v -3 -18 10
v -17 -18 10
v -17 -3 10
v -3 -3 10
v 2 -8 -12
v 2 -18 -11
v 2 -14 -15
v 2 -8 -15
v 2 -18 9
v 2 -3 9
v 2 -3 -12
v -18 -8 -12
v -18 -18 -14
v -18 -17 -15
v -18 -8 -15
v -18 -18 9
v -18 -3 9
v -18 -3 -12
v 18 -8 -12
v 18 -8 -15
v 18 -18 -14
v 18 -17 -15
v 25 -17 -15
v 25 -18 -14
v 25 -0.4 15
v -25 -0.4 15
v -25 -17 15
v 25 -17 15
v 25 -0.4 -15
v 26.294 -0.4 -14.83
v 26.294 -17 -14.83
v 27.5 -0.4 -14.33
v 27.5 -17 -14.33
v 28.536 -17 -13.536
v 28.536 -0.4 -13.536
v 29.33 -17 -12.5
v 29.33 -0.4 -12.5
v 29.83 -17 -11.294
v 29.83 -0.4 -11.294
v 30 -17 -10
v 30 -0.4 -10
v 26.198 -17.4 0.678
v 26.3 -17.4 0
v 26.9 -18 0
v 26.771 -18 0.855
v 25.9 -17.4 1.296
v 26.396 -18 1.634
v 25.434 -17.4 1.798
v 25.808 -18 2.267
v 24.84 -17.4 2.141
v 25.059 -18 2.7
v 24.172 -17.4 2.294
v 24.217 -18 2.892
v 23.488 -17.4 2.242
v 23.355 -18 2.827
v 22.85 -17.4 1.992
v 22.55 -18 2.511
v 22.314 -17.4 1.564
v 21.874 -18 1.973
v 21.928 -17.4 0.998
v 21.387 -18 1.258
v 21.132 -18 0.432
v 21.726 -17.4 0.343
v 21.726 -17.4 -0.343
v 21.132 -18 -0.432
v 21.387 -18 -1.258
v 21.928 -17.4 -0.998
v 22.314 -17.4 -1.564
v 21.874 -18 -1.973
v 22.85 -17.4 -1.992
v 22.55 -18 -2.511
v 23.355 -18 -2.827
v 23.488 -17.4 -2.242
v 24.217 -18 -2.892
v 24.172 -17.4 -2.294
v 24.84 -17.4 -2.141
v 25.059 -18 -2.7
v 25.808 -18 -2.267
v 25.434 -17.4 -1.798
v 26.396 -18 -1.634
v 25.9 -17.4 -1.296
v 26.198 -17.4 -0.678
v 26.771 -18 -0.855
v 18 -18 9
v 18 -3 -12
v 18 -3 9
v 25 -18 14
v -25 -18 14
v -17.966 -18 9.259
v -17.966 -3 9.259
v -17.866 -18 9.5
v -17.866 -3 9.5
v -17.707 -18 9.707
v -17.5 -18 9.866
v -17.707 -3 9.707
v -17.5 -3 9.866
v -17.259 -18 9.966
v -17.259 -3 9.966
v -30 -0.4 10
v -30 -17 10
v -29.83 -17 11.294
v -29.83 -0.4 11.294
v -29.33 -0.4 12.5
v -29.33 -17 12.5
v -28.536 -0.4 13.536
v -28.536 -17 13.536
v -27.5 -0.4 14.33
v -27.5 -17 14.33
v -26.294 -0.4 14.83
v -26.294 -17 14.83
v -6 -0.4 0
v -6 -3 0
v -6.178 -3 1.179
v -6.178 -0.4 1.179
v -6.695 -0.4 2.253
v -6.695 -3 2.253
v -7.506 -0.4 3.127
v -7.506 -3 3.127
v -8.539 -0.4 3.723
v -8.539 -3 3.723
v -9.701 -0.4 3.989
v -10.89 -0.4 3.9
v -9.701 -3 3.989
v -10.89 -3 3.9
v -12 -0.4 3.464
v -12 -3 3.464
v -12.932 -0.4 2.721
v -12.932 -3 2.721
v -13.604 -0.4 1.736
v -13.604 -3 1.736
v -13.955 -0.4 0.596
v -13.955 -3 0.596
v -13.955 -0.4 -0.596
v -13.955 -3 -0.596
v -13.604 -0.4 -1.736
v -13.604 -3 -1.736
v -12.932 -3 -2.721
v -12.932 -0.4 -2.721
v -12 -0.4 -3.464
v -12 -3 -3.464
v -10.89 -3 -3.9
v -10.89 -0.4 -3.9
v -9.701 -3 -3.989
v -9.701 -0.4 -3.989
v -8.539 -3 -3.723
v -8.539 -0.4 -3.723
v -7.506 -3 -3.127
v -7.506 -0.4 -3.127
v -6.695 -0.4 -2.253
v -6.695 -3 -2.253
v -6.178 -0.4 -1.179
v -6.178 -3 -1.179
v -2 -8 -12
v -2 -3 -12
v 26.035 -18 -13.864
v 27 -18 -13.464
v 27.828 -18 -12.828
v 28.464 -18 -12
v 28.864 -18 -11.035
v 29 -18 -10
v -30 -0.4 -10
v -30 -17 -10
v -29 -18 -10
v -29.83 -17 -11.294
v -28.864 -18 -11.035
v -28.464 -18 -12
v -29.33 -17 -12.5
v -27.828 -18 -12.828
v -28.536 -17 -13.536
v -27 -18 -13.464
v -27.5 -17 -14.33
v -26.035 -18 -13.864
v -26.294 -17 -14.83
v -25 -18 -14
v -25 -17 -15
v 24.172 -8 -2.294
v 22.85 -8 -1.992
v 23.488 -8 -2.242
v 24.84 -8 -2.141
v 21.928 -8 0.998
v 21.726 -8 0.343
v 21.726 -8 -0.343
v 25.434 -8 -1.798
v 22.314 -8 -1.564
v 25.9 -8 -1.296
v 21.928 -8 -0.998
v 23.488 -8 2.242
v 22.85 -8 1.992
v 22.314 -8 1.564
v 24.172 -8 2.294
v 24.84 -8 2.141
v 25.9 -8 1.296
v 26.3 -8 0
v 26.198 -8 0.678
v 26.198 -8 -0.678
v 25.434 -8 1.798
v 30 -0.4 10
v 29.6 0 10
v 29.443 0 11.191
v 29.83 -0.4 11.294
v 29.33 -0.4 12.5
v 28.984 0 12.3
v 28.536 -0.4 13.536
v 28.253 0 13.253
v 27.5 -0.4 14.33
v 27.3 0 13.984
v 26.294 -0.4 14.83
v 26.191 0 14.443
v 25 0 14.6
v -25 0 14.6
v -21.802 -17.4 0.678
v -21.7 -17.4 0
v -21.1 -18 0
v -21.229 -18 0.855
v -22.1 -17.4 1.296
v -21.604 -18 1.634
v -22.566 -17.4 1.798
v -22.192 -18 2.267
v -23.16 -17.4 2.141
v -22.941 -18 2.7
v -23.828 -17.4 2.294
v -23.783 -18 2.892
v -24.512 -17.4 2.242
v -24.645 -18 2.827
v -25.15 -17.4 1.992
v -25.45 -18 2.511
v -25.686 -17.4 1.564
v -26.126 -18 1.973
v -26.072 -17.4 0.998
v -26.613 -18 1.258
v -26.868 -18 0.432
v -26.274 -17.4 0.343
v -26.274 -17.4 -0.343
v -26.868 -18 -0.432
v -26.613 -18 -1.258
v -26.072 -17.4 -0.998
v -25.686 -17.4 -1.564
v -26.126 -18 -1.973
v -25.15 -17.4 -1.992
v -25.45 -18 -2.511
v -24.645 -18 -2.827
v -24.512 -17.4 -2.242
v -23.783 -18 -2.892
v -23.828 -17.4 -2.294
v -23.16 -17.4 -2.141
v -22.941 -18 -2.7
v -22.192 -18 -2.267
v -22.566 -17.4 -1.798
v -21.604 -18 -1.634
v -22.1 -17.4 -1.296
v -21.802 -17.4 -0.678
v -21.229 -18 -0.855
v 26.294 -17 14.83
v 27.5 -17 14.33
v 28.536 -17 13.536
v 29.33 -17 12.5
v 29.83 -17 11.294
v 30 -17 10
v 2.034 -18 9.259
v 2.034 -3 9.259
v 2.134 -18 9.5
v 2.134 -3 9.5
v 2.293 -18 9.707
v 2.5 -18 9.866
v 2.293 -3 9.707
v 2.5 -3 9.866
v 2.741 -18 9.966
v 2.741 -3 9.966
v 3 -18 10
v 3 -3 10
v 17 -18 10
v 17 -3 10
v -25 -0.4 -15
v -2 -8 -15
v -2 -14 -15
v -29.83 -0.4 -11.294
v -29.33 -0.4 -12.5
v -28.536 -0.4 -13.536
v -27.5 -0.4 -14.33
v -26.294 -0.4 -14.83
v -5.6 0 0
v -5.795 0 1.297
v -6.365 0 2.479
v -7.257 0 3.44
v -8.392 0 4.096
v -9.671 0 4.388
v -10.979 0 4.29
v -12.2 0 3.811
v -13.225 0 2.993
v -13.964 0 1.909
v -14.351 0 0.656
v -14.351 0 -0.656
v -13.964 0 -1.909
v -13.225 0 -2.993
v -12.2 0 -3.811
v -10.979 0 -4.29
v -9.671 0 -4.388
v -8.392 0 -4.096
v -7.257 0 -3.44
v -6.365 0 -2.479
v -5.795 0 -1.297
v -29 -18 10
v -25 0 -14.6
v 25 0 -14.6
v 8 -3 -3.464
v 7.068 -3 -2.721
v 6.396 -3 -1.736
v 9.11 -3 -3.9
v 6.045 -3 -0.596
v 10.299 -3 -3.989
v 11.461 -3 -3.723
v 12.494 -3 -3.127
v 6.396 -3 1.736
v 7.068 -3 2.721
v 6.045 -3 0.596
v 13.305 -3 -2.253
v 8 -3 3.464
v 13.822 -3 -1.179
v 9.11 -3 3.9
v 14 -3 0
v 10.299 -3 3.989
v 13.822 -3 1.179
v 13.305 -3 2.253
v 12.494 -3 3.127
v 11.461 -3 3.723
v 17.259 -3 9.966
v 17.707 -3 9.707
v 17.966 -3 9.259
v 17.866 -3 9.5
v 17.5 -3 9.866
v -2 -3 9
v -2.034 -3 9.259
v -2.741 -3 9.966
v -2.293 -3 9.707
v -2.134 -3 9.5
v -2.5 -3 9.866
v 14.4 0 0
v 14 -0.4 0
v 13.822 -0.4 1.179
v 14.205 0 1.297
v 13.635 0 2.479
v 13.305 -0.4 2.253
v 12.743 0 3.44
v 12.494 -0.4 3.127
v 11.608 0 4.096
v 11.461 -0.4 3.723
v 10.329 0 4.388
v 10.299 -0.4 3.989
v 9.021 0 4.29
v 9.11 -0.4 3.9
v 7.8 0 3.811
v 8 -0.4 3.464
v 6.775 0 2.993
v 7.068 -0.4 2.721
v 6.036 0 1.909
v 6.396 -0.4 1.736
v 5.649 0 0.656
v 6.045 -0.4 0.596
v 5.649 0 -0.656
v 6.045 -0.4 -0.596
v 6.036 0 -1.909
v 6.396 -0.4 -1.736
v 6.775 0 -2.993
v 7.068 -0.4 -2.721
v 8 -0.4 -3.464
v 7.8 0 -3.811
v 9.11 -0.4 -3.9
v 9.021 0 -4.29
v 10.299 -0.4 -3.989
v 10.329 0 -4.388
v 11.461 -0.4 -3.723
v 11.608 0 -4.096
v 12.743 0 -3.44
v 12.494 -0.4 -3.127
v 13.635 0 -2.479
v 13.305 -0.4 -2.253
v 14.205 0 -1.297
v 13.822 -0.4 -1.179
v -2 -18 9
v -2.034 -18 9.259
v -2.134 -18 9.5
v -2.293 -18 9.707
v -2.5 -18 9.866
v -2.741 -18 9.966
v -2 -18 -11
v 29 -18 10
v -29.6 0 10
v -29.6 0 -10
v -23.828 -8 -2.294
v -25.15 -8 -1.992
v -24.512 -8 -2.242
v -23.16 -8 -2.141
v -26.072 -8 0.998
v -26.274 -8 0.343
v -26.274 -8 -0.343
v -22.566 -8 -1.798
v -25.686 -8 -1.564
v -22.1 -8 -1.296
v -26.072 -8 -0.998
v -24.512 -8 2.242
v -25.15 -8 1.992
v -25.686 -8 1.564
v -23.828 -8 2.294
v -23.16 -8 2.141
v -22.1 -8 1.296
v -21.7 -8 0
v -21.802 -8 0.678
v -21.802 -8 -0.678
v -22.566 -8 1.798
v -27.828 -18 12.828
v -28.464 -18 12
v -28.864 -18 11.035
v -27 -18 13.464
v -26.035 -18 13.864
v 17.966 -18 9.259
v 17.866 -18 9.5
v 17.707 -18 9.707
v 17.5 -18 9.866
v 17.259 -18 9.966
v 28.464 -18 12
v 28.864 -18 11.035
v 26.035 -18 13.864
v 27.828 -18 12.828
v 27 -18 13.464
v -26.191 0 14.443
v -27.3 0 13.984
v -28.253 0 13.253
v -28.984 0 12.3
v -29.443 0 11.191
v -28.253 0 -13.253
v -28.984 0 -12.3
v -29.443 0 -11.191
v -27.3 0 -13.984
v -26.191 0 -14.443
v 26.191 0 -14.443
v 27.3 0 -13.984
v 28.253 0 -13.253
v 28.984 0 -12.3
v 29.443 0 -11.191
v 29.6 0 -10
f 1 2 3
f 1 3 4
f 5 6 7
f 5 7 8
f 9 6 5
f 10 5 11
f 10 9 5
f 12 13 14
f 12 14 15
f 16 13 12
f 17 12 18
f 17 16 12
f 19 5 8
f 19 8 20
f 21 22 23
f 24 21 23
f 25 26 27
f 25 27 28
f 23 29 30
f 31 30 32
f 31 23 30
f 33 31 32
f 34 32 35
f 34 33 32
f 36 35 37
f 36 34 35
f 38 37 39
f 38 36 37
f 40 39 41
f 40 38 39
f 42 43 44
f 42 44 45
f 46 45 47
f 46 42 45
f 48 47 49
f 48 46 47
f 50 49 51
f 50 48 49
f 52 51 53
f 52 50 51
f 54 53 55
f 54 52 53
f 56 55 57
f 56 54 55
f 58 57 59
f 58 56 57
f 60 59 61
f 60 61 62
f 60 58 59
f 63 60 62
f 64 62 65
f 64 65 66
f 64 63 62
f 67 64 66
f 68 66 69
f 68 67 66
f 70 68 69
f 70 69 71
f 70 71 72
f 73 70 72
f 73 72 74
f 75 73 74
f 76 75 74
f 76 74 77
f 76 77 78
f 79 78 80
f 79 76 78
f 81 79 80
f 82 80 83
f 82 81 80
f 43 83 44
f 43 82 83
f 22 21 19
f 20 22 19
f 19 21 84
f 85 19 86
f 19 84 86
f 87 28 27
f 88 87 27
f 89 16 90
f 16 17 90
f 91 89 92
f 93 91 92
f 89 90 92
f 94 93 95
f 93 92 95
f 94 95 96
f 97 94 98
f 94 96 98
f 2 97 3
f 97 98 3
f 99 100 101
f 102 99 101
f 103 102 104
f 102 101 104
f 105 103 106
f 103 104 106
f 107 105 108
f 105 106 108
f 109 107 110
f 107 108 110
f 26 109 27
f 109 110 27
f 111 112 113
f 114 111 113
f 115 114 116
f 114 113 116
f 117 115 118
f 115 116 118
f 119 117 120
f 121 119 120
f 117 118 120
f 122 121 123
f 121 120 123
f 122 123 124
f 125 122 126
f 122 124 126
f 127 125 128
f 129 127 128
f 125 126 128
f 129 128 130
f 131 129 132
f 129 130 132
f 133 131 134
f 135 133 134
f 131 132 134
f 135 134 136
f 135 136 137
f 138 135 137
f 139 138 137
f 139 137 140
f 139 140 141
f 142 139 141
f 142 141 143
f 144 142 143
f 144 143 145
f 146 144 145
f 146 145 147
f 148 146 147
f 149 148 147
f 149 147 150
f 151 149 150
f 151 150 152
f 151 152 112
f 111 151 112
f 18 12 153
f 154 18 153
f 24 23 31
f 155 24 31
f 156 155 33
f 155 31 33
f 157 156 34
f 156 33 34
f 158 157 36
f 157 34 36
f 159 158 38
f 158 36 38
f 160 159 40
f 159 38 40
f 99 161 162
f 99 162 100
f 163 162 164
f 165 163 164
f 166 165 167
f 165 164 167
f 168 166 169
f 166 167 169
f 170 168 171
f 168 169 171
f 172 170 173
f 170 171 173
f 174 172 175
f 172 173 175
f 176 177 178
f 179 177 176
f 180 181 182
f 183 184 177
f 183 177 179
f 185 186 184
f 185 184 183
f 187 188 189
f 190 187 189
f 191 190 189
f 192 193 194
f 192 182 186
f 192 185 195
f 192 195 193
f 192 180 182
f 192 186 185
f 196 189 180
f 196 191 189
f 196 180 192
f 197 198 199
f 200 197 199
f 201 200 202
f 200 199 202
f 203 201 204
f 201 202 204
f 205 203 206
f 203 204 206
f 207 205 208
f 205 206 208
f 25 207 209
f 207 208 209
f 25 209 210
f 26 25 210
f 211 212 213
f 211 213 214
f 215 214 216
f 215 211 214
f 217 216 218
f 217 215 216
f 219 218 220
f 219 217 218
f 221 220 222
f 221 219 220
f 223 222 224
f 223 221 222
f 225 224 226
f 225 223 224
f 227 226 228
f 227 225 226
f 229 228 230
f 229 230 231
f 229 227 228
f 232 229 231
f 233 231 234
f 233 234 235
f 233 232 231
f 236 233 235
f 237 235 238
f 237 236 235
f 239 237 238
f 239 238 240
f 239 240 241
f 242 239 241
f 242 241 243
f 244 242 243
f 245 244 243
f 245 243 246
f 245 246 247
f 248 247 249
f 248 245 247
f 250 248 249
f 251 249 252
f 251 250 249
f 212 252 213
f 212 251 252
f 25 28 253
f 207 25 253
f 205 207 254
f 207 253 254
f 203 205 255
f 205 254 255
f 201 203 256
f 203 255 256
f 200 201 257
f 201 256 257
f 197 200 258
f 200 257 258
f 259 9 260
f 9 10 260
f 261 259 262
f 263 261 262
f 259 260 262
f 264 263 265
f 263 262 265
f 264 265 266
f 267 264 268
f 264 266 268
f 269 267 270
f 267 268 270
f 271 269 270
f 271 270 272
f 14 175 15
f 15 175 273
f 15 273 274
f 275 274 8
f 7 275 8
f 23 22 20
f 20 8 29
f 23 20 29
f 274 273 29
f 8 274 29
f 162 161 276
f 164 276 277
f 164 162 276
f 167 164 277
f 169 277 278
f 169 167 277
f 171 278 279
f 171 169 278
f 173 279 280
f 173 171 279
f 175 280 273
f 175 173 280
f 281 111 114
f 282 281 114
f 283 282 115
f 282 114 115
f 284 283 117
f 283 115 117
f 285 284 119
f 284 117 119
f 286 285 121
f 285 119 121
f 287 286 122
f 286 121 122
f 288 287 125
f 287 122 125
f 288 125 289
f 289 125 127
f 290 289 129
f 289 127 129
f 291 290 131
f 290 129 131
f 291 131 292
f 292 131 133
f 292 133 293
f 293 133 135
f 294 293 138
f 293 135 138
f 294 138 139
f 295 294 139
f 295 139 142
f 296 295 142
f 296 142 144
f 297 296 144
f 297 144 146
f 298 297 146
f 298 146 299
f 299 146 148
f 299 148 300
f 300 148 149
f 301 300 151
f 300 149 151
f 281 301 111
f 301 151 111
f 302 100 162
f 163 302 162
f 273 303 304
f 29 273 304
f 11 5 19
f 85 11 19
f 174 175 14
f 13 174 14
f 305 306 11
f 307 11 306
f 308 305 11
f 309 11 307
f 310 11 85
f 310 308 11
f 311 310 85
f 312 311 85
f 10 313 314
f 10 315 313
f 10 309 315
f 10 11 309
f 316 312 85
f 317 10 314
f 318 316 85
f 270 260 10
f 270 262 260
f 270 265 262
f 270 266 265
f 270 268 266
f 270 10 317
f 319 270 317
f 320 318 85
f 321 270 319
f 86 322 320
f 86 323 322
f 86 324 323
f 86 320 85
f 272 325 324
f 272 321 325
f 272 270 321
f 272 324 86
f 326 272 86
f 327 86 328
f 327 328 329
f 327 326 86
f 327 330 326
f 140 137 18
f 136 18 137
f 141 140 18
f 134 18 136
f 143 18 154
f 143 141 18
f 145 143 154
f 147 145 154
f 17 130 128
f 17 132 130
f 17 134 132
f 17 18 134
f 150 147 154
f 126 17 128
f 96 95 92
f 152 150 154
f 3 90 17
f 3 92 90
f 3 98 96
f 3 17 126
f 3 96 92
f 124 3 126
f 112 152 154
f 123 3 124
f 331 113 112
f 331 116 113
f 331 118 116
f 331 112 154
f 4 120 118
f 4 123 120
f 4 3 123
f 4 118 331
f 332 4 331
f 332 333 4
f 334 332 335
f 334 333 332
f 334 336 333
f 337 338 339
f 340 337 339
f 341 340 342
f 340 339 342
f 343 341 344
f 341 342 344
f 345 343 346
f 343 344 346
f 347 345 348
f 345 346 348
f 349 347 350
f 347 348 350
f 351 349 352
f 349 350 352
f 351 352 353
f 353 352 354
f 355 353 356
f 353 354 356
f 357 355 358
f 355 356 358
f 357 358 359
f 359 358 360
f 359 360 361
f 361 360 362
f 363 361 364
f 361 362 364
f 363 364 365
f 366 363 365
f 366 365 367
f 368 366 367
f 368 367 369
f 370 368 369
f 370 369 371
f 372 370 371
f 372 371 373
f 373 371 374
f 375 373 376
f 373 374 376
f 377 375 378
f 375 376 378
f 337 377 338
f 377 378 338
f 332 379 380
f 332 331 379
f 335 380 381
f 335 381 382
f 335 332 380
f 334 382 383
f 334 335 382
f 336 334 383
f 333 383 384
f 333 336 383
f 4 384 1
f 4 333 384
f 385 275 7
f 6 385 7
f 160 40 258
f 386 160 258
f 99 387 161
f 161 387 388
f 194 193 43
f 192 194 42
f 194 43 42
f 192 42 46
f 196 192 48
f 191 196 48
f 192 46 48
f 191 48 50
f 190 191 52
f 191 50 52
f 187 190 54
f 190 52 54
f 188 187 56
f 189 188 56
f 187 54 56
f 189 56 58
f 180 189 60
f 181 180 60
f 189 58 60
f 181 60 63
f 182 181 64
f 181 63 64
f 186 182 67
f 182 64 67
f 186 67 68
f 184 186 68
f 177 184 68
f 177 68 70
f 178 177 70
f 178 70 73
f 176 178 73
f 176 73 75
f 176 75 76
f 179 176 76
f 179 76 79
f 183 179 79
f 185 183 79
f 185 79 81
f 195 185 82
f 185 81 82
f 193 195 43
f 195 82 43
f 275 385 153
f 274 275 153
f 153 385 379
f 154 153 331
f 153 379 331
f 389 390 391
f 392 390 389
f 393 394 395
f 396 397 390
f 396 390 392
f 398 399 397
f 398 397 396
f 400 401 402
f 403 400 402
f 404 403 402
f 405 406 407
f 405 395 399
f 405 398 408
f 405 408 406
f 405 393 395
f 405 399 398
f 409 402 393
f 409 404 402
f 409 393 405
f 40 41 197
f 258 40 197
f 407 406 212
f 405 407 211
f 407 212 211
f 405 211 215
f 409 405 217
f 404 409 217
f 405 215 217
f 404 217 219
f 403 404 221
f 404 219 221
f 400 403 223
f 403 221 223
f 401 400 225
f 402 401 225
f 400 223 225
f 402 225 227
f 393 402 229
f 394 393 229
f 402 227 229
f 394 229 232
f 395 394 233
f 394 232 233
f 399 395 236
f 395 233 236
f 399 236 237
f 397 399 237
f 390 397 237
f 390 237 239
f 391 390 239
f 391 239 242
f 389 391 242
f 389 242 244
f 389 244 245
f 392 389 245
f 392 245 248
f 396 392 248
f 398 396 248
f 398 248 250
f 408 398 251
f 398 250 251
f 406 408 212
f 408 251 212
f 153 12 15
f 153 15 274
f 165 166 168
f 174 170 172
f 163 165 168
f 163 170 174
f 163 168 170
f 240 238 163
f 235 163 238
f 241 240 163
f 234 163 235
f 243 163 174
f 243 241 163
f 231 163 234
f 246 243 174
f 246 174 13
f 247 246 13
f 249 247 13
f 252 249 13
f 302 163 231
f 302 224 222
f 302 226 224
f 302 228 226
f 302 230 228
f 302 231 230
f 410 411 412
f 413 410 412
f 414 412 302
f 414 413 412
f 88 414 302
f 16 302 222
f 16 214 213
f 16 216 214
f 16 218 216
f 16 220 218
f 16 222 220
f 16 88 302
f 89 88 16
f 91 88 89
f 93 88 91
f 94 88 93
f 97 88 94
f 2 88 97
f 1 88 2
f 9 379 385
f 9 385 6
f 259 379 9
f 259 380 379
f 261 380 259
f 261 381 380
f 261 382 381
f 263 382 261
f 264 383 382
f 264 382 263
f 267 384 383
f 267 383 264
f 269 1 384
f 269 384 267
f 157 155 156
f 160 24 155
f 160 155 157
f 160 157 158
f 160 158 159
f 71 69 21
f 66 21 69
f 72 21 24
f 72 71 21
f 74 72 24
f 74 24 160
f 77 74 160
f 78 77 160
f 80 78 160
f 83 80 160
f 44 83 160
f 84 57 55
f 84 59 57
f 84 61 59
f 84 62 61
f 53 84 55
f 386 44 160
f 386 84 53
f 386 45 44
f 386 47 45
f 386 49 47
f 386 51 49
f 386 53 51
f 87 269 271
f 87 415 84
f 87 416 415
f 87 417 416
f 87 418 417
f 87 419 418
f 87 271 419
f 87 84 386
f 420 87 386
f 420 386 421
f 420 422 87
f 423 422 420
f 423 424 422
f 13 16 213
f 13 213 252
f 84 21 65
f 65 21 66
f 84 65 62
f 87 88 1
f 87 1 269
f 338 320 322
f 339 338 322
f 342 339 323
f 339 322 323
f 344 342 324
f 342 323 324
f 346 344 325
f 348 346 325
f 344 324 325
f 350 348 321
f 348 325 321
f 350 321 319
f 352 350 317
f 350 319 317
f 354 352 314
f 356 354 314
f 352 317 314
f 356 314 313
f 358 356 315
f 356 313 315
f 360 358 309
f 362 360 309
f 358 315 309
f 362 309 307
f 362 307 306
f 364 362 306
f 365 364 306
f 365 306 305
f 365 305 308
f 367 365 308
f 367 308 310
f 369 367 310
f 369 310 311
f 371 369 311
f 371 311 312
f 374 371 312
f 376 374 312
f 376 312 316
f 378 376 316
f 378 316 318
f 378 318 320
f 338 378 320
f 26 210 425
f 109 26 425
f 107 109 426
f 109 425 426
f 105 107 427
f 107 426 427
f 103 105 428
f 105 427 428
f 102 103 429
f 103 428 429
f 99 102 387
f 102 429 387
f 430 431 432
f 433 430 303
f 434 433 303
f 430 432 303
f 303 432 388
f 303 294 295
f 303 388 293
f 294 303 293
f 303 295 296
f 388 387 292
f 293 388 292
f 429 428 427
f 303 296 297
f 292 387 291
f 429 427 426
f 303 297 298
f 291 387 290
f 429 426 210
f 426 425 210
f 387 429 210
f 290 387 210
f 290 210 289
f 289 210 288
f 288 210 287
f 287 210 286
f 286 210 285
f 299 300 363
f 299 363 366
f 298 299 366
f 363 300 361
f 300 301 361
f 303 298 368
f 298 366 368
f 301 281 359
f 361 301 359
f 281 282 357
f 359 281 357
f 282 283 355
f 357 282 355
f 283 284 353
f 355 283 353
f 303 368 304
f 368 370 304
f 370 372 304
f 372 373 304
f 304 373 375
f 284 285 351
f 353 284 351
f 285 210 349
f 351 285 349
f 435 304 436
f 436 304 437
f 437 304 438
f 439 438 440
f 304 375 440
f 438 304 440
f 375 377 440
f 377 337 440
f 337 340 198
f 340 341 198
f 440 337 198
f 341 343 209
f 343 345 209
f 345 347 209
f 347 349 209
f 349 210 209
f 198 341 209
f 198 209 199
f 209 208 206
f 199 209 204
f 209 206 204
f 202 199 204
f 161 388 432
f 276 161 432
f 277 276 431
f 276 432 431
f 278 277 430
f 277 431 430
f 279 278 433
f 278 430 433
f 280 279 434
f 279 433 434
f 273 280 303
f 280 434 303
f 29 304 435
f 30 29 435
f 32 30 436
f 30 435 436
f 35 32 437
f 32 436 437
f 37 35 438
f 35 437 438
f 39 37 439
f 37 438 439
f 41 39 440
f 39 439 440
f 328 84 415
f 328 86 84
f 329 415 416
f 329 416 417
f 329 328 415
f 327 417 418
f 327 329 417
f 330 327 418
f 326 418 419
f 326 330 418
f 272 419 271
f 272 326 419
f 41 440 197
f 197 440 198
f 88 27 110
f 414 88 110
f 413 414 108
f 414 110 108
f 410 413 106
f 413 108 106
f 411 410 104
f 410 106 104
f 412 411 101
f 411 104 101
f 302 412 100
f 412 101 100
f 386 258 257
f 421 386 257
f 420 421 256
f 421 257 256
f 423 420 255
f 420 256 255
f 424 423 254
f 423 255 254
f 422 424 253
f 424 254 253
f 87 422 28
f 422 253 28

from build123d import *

# Parameters (mm, degrees)
SKETCH_W        = 60
SKETCH_H        = 30
PAD_DEPTH       = 18
SKETCH001_W     = 16
SKETCH001_H     = 22
POCKET_DEPTH    = 15
SKETCH002_W     = 16
SKETCH002_H     = 10
POCKET001_DEPTH = 5
SKETCH003_R     = 2.3
POCKET002_DEPTH = 10
FILLET_R        = 5
CHAMFER_SIZE    = 4
CHAMFER001_SIZE = 0.6
CHAMFER002_SIZE = 1
SKETCH004_R     = 4
POCKET003_DEPTH = 5
CHAMFER003_SIZE = 0.4
FILLET001_R     = 1


with BuildPart() as part:
    # Sketch (on XZ_Plane of Origin) → Pad (new body)
    with BuildSketch(Plane.XZ):
        Rectangle(SKETCH_W, SKETCH_H)
    extrude(amount=PAD_DEPTH)

    # Sketch001 (on Face6 of Pad) → Pocket (cut)
    with BuildSketch(Plane.XZ.offset(18)):
        with Locations((-10, -1)):
            Rectangle(SKETCH001_W, SKETCH001_H)
        with Locations((10, -1)):
            Rectangle(SKETCH001_W, SKETCH001_H)
    extrude(amount=-POCKET_DEPTH, mode=Mode.SUBTRACT)

    # Sketch002 (on Face13 of Pocket) → Pocket001 (cut)
    with BuildSketch(Plane.XY.offset(-12)):
        with Locations((-10, -13)):
            Rectangle(SKETCH002_W, SKETCH002_H)
        with Locations((10, -13)):
            Rectangle(SKETCH002_W, SKETCH002_H)
    extrude(amount=-POCKET001_DEPTH, mode=Mode.SUBTRACT)

    # Sketch003 (on Face4 of Pocket001) → Pocket002 (cut)
    with BuildSketch(Plane.XZ.offset(18)):
        with Locations((-24, 0)):
            Circle(SKETCH003_R)
        with Locations((24, 0)):
            Circle(SKETCH003_R)
    extrude(amount=-POCKET002_DEPTH, mode=Mode.SUBTRACT)

    # Fillet
    fillet_edges = [part.edges().sort_by_distance(p)[0] for p in [
        (30, -9, -15),
        (30, -9, 15),
        (-30, -9, 15),
        (-30, -9, -15),
    ]]
    fillet(fillet_edges, radius=FILLET_R)

    # Chamfer
    chamfer_edges = [part.edges().sort_by_distance(p)[0] for p in [
        (0, -18, -15),
    ]]
    chamfer(chamfer_edges, length=CHAMFER_SIZE)

    # Chamfer001
    chamfer001_edges = [part.edges().sort_by_distance(p)[0] for p in [
        (-26.3, -18, 0),
        (21.7, -18, 0),
    ]]
    chamfer(chamfer001_edges, length=CHAMFER001_SIZE)

    # Chamfer002
    chamfer002_edges = [part.edges().sort_by_distance(p)[0] for p in [
        (-21.5, -18, -15),
    ]]
    chamfer(chamfer002_edges, length=CHAMFER002_SIZE)

    # Sketch004 → Pocket003 (cut)
    with BuildSketch(Plane.XZ.offset(3)):
        with Locations((-10, 0)):
            Circle(SKETCH004_R)
        with Locations((10, 0)):
            Circle(SKETCH004_R)
    extrude(amount=-POCKET003_DEPTH, mode=Mode.SUBTRACT)

    # Chamfer003
    chamfer003_edges = [part.edges().sort_by_distance(p)[0] for p in [
        (0, 0, -15),
        (-28.535534, 0, -13.535534),
        (28.535534, 0, -13.535534),
        (-30, 0, 0),
        (30, 0, 0),
        (-28.535534, 0, 13.535534),
        (28.535534, 0, 13.535534),
        (0, 0, 15),
        (-14, 0, 0),
        (6, 0, 0),
    ]]
    chamfer(chamfer003_edges, length=CHAMFER003_SIZE)

    # Fillet001
    fillet001_edges = [part.edges().sort_by_distance(p)[0] for p in [
        (-2, -10.5, 10),
        (2, -10.5, 10),
        (18, -10.5, 10),
        (-18, -10.5, 10),
    ]]
    fillet(fillet001_edges, radius=FILLET001_R)


solid = part.part
